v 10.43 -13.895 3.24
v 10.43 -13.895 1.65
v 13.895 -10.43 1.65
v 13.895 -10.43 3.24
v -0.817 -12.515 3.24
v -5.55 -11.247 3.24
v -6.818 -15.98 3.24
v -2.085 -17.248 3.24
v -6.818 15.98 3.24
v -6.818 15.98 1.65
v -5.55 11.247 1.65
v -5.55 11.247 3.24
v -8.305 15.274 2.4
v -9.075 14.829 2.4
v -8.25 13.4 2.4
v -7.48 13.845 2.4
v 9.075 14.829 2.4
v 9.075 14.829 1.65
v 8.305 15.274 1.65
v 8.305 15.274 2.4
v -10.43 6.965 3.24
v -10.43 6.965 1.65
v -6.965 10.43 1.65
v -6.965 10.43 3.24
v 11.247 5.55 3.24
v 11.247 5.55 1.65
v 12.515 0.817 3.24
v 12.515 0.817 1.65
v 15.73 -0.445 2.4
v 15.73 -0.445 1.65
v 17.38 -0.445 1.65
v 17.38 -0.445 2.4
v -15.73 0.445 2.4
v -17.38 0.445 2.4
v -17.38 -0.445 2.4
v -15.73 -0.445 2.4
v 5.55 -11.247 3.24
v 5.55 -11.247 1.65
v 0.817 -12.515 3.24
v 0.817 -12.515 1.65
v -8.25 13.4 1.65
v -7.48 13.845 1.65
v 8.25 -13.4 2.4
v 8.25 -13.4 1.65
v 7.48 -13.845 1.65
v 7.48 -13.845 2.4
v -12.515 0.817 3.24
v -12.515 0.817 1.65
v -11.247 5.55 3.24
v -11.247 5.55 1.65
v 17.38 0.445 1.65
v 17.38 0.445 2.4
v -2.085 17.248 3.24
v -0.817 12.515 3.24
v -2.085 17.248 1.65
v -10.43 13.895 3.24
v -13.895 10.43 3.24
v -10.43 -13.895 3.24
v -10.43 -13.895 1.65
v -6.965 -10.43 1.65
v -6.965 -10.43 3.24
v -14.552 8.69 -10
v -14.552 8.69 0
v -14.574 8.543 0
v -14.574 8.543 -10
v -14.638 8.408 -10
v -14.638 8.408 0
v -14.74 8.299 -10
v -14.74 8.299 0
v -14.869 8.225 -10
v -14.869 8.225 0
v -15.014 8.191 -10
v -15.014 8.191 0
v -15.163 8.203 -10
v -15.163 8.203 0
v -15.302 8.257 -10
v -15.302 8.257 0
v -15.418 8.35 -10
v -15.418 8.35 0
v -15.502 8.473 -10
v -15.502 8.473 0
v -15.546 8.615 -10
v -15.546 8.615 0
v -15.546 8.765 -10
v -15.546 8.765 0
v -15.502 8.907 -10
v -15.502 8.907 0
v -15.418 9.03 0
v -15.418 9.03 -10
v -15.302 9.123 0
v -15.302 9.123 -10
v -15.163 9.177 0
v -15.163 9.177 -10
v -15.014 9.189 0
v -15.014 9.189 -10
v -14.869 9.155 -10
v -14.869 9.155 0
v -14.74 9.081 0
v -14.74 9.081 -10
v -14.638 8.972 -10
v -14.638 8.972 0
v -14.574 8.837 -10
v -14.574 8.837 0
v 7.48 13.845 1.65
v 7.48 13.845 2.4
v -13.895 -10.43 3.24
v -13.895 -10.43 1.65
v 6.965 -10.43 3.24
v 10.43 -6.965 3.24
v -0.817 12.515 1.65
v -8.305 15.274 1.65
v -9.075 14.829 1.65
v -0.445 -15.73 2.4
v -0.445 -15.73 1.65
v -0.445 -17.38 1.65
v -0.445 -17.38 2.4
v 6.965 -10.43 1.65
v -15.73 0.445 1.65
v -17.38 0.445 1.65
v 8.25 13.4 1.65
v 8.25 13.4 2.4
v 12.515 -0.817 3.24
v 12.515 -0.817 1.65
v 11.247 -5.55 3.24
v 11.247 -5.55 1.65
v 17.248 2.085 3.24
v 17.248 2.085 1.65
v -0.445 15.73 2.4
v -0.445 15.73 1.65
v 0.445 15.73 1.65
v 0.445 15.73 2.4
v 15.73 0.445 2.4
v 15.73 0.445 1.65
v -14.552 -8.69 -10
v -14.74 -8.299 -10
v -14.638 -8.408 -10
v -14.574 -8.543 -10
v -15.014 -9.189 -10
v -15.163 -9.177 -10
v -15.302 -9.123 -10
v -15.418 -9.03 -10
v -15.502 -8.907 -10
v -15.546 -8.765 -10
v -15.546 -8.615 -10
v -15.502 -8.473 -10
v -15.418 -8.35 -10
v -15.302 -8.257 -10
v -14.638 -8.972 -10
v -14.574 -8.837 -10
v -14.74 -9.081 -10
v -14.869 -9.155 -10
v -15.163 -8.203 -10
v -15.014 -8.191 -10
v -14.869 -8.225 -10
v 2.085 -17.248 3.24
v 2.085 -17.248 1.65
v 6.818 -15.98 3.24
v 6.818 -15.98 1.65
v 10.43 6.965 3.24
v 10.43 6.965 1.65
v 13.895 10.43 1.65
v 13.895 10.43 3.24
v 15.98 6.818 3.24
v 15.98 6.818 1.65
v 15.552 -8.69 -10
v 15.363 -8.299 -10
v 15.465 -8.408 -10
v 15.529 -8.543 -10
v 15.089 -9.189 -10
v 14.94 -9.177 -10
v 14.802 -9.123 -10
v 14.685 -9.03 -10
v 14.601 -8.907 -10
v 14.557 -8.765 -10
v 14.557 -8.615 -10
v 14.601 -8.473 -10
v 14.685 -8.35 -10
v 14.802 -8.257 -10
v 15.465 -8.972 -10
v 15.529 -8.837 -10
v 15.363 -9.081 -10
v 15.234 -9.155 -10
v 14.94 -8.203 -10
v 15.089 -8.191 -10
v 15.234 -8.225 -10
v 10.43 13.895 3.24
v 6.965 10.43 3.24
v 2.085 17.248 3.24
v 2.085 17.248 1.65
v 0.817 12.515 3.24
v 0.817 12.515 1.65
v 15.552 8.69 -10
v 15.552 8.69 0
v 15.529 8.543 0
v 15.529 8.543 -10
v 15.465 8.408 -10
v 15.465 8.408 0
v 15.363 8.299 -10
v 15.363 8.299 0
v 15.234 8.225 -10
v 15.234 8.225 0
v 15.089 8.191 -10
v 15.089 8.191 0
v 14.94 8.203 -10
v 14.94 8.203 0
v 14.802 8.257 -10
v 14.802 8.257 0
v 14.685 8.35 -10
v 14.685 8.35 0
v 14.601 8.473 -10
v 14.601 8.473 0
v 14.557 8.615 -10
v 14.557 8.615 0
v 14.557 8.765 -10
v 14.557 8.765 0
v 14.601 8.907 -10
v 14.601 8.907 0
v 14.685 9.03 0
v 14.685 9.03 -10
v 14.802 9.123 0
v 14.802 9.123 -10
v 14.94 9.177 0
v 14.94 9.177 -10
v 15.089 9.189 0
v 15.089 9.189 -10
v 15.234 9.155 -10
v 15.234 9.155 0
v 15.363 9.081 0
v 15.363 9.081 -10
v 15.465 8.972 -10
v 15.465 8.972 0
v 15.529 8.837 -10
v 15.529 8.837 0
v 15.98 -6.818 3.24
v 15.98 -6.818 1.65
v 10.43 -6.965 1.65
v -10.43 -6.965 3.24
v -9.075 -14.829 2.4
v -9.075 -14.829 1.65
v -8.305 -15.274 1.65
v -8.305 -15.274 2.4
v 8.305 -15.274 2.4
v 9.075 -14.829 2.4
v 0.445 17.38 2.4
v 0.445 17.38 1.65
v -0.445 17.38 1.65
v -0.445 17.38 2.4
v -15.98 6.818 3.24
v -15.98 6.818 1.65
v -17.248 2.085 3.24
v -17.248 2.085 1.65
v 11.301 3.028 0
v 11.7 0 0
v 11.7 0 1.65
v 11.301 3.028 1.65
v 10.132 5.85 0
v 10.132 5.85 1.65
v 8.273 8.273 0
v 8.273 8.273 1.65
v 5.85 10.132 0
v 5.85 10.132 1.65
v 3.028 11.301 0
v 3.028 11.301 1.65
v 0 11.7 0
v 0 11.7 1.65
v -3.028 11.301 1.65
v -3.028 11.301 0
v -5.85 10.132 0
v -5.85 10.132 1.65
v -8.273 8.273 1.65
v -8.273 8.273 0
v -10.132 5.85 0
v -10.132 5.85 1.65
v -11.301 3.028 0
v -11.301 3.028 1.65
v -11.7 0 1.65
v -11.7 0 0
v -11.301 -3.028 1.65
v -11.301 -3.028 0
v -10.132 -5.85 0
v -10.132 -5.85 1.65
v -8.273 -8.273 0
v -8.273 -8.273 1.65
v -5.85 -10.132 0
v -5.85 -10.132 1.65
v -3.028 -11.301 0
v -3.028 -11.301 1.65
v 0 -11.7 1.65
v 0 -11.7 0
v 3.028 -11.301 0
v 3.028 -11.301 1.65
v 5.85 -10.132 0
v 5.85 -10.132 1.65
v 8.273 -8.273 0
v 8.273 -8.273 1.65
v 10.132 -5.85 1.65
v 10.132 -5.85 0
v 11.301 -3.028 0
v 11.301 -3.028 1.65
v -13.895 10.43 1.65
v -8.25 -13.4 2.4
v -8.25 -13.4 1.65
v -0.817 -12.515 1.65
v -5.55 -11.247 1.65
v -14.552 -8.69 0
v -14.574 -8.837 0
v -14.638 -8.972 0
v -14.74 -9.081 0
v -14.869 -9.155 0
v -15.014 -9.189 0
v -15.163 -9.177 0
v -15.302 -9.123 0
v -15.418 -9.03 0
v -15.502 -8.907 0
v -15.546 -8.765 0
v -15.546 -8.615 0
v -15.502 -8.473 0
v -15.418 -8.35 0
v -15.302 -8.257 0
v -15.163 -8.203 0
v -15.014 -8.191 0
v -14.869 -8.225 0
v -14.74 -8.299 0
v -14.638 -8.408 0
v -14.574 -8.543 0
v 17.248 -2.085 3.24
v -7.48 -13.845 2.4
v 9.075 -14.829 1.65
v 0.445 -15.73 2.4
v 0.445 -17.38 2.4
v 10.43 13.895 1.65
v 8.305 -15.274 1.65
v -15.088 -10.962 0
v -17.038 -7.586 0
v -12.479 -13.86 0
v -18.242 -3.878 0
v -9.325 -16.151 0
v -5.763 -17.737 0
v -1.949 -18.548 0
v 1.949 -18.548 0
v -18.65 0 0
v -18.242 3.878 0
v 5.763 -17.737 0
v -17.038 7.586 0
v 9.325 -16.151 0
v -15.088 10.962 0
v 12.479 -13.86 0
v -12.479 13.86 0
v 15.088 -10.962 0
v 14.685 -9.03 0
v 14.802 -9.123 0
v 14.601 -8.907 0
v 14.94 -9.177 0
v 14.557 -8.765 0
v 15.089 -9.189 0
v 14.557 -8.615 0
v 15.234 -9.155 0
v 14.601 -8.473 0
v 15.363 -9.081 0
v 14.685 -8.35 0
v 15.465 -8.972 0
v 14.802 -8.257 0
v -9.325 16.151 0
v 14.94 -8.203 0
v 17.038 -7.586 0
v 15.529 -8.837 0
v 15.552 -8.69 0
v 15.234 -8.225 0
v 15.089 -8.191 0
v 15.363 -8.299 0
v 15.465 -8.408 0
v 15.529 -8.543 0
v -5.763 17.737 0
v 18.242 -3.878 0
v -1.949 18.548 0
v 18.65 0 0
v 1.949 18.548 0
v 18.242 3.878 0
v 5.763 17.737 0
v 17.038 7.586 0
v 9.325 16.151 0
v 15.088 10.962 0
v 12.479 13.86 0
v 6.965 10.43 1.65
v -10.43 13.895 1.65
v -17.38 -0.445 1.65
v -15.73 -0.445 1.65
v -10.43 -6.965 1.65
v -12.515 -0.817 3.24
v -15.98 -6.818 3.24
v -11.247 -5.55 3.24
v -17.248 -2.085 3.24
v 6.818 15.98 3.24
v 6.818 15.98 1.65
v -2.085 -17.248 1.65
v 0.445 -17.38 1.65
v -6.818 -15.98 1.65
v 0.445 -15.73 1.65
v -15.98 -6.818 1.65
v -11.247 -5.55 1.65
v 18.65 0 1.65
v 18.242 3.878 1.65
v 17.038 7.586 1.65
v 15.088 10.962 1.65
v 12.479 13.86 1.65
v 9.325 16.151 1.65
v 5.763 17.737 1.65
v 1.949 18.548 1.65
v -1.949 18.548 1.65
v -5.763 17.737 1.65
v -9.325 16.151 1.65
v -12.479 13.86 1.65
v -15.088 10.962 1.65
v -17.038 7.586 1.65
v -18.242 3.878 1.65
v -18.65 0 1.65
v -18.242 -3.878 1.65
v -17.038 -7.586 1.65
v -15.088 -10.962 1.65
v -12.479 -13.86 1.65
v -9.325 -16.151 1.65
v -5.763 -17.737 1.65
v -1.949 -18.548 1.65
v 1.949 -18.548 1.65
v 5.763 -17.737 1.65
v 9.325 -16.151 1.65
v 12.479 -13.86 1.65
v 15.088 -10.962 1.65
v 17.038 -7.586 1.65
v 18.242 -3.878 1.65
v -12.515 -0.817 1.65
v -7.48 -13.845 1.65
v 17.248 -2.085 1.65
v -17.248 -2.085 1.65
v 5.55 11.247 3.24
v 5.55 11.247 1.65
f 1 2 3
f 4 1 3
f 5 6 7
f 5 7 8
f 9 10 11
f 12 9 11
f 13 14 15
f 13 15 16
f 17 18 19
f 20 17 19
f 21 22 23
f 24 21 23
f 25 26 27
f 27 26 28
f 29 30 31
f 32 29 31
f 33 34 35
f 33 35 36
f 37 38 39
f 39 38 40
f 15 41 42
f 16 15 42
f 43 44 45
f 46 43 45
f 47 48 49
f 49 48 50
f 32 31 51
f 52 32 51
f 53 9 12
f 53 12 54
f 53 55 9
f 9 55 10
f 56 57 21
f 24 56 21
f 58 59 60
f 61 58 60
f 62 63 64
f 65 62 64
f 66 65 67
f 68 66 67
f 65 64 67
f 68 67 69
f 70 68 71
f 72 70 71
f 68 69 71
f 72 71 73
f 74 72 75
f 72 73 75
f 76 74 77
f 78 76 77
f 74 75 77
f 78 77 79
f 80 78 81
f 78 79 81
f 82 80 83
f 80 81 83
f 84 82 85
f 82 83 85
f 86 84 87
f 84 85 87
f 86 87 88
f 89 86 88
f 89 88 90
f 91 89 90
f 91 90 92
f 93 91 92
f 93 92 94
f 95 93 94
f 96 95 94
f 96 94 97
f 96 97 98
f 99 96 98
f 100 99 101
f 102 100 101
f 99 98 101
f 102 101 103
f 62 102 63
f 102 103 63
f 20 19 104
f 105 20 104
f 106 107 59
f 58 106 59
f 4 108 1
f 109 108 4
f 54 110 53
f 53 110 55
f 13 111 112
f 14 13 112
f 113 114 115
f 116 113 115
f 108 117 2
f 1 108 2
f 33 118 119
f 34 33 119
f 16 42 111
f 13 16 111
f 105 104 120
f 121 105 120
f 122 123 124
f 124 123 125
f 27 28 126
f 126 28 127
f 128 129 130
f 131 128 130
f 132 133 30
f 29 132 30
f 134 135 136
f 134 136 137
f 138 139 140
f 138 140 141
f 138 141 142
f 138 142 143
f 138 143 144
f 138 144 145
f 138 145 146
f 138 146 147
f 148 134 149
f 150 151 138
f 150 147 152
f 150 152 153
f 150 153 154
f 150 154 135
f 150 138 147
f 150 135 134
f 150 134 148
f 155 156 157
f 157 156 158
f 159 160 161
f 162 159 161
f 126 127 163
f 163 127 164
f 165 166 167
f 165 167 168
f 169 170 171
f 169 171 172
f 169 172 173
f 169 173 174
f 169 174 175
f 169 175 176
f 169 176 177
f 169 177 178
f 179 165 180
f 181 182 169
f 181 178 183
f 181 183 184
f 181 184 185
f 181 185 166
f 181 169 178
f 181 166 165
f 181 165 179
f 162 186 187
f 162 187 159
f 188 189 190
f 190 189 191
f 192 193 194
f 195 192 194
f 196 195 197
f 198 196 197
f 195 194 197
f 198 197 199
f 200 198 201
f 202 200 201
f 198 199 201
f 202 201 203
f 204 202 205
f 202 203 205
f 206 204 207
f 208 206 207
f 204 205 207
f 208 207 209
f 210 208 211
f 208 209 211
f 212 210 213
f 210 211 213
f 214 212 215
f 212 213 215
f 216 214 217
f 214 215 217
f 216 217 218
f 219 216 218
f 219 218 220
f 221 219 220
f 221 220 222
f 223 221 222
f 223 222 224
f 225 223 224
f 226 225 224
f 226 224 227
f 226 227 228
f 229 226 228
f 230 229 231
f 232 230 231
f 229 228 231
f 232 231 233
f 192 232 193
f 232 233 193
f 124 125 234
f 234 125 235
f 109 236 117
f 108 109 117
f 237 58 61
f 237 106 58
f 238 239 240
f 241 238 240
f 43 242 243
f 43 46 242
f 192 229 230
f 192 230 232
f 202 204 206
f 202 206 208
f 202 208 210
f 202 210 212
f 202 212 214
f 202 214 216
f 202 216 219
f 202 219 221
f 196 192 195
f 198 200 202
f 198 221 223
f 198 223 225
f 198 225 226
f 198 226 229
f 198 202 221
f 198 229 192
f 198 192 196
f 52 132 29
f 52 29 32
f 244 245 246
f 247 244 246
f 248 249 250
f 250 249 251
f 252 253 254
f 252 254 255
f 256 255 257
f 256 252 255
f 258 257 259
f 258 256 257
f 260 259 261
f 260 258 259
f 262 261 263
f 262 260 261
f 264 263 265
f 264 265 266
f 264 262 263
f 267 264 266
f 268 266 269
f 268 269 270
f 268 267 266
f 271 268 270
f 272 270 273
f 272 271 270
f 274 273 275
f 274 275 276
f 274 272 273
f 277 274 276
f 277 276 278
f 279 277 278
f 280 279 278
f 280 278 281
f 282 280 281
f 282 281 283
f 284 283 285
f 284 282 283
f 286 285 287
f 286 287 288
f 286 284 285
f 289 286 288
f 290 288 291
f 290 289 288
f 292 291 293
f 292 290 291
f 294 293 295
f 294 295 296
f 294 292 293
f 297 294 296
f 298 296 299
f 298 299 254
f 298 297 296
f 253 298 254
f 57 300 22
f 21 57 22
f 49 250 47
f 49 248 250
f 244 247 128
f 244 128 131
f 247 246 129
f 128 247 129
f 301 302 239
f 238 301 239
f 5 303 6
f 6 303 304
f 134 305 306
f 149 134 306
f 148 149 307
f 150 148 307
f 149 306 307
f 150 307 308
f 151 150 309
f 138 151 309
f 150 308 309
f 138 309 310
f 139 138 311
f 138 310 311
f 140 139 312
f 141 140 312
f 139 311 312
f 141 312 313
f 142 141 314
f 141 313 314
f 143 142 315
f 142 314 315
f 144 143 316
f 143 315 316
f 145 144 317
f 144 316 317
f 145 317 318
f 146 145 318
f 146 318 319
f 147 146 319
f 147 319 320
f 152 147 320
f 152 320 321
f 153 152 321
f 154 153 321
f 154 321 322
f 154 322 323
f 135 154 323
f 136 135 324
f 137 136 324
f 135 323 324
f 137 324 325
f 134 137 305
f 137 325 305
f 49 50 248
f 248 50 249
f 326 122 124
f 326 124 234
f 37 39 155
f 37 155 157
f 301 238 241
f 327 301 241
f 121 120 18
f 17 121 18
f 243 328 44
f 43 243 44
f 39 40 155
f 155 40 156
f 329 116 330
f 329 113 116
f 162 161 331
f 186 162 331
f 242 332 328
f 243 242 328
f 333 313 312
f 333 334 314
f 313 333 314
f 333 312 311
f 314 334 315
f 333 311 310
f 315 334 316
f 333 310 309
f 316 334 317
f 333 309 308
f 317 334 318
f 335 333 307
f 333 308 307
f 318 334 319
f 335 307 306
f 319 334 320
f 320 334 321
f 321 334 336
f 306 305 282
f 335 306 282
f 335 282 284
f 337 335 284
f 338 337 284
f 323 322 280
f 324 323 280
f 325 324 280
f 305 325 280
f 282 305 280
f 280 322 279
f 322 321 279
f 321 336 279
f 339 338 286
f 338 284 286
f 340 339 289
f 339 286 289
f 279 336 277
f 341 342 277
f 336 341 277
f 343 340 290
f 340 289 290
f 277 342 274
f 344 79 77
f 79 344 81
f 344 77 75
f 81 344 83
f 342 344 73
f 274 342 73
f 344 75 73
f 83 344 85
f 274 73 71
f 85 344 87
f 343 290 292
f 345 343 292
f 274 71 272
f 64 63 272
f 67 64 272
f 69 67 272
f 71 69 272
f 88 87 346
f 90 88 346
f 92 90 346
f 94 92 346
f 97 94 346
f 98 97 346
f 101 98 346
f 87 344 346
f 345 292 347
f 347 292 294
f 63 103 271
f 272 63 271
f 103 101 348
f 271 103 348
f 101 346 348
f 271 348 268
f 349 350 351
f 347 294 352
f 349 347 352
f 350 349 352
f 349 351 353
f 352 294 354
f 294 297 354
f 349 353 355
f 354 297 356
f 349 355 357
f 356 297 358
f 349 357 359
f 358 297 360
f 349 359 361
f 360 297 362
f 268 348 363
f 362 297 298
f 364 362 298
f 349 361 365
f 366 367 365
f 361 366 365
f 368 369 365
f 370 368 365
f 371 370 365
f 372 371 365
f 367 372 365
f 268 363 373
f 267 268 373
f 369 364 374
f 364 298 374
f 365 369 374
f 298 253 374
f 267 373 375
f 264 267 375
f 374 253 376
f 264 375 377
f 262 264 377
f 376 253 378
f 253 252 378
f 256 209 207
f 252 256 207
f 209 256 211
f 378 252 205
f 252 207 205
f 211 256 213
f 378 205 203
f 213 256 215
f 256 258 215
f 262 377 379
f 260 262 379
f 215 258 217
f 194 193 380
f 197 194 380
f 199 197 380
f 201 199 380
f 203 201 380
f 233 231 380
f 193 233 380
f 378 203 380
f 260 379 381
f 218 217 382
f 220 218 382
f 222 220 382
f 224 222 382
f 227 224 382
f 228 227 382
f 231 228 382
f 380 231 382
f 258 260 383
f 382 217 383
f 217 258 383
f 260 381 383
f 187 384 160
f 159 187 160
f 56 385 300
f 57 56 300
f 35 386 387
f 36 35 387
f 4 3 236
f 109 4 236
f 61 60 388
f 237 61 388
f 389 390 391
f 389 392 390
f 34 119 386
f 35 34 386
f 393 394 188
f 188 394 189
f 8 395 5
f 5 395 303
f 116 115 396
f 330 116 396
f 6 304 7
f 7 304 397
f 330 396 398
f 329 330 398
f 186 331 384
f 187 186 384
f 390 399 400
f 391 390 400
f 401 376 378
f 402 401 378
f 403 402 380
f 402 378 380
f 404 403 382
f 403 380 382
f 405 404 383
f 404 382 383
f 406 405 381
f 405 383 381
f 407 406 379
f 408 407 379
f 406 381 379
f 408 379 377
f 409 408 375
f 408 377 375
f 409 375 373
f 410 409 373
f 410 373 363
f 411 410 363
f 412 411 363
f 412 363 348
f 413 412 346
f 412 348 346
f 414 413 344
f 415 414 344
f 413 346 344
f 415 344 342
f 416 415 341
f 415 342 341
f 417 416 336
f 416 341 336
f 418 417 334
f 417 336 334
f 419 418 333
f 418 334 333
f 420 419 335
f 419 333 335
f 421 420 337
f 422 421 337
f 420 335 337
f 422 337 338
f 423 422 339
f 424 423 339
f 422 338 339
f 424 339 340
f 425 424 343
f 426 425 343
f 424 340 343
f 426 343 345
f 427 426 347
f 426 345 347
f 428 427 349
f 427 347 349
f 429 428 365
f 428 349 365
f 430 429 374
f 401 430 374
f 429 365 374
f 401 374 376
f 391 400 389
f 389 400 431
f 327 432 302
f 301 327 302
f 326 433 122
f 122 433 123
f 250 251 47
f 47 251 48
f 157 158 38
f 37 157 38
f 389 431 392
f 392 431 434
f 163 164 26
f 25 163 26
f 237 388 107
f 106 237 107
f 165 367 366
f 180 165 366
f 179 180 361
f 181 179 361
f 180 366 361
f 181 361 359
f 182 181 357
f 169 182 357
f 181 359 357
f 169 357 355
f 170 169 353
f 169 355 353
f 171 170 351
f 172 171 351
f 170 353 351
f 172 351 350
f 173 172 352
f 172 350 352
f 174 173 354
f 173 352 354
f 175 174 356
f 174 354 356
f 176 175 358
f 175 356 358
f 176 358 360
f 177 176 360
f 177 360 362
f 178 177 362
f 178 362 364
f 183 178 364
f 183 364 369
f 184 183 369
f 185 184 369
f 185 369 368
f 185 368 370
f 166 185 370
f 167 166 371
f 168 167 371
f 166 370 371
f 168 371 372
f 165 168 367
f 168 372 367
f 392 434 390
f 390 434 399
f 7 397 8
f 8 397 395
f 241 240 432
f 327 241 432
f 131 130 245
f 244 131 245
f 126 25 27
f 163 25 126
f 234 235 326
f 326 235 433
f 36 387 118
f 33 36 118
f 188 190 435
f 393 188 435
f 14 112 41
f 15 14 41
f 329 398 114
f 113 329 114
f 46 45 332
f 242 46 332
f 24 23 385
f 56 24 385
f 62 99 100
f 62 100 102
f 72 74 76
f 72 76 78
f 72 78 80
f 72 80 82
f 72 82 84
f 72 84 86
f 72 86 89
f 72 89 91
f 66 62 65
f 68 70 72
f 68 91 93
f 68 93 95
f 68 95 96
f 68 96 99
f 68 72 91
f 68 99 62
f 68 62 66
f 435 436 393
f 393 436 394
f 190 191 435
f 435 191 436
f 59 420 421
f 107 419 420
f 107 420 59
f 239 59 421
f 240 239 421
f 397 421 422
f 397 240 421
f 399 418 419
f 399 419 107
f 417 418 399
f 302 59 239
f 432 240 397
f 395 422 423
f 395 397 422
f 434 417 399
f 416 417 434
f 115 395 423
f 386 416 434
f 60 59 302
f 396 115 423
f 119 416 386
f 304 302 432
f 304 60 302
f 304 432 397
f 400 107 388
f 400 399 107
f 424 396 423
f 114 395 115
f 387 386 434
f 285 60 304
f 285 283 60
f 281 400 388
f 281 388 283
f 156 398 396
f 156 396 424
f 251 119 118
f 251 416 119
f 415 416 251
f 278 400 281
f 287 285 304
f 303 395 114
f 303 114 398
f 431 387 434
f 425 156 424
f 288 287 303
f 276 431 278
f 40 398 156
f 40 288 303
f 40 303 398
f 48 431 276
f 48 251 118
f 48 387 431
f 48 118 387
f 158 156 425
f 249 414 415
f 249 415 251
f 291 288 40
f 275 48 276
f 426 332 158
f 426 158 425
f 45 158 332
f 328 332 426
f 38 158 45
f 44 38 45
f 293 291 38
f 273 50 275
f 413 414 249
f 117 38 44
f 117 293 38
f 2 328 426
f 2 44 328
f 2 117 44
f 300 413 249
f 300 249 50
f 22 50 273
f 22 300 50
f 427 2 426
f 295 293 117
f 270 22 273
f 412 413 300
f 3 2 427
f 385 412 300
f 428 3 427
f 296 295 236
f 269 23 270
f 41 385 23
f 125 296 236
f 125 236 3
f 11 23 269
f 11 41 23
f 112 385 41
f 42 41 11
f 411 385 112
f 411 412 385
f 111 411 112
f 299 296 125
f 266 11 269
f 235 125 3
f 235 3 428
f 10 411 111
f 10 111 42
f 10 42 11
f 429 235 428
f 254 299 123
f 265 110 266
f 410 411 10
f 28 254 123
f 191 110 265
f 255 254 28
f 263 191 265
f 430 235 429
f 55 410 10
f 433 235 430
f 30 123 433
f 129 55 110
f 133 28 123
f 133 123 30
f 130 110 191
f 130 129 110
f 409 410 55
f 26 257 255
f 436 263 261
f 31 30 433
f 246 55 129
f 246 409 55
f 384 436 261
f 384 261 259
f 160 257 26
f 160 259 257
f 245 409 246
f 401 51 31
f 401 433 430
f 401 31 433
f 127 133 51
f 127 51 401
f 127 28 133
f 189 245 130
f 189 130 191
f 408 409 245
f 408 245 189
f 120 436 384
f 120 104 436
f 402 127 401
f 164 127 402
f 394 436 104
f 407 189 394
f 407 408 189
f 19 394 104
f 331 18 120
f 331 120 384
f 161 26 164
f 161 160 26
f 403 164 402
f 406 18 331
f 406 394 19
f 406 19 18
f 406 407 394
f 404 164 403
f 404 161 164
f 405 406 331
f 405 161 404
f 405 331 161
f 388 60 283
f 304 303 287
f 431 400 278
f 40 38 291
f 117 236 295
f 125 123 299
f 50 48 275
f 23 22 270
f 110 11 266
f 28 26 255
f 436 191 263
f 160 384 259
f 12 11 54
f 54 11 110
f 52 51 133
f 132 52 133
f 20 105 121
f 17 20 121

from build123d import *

# Parameters (mm, degrees)
F0_R     = 18.65
F0_R_2   = 11.7
F1_DEPTH = 1.65
F3_DEPTH = 1.59
F5_DEPTH = 0.75
F6_R     = 0.5
F7_DEPTH = 10


with BuildPart() as f1:
    # F0 (on Top) → F1 (new body)
    with BuildSketch(Plane.XY):
        Circle(F0_R)
        Circle(F0_R_2, mode=Mode.SUBTRACT)
    extrude(amount=F1_DEPTH)

    # F2 (on face) → F3 (join)
    with BuildSketch(Plane.XY.offset(1.65)):
        Polygon((6.8182058502, 15.9798175517), (4.4516875758, 16.6139242122), (2.0851693014, 17.2480308727), (0.8169559804, 12.5149943239), (3.1834742548, 11.8808876634), (5.5499925292, 11.2467810029), align=None)
        Polygon((-6.8182058502, 15.9798175517), (-5.5499925292, 11.2467810029), (-3.1834742548, 11.8808876634), (-0.8169559804, 12.5149943239), (-2.0851693014, 17.2480308727), (-4.4516875758, 16.6139242122), align=None)
        Polygon((-13.8946482503, 10.4298250225), (-10.4298250225, 6.9650017947), (-8.6974134086, 8.6974134086), (-6.9650017947, 10.4298250225), (-10.4298250225, 13.8946482503), (-12.1622366364, 12.1622366364), align=None)
        Polygon((-17.2480308727, 2.0851693014), (-12.5149943239, 0.8169559804), (-11.8808876634, 3.1834742548), (-11.2467810029, 5.5499925292), (-15.9798175517, 6.8182058502), (-16.6139242122, 4.4516875758), align=None)
        Polygon((-15.9798175517, -6.8182058502), (-11.2467810029, -5.5499925292), (-11.8808876634, -3.1834742548), (-12.5149943239, -0.8169559804), (-17.2480308727, -2.0851693014), (-16.6139242122, -4.4516875758), align=None)
        Polygon((-10.4298250225, -13.8946482503), (-6.9650017947, -10.4298250225), (-8.6974134086, -8.6974134086), (-10.4298250225, -6.9650017947), (-13.8946482503, -10.4298250225), (-12.1622366364, -12.1622366364), align=None)
        Polygon((-2.0851693014, -17.2480308727), (-0.8169559804, -12.5149943239), (-3.1834742548, -11.8808876634), (-5.5499925292, -11.2467810029), (-6.8182058502, -15.9798175517), (-4.4516875758, -16.6139242122), align=None)
        Polygon((6.8182058502, -15.9798175517), (5.5499925292, -11.2467810029), (3.1834742548, -11.8808876634), (0.8169559804, -12.5149943239), (2.0851693014, -17.2480308727), (4.4516875758, -16.6139242122), align=None)
        Polygon((13.8946482503, -10.4298250225), (10.4298250225, -6.9650017947), (8.6974134086, -8.6974134086), (6.9650017947, -10.4298250225), (10.4298250225, -13.8946482503), (12.1622366364, -12.1622366364), align=None)
        Polygon((17.2480308727, -2.0851693014), (12.5149943239, -0.8169559804), (11.8808876634, -3.1834742548), (11.2467810029, -5.5499925292), (15.9798175517, -6.8182058502), (16.6139242122, -4.4516875758), align=None)
        Polygon((15.9798175517, 6.8182058502), (11.2467810029, 5.5499925292), (11.8808876634, 3.1834742548), (12.5149943239, 0.8169559804), (17.2480308727, 2.0851693014), (16.6139242122, 4.4516875758), align=None)
        Polygon((10.4298250225, 13.8946482503), (6.9650017947, 10.4298250225), (8.6974134086, 8.6974134086), (10.4298250225, 6.9650017947), (13.8946482503, 10.4298250225), (12.1622366364, 12.1622366364), align=None)
    extrude(amount=F3_DEPTH)

    # F4 (on face) → F5 (join)
    with BuildSketch(Plane.XY.offset(1.65)):
        Polygon((0.445, 17.38), (0, 17.38), (-0.445, 17.38), (-0.445, 15.73), (0, 15.73), (0.445, 15.73), align=None)
        Polygon((9.0753813047, 14.8290215178), (8.69, 15.0515215178), (8.3046186953, 15.2740215178), (7.4796186953, 13.8450796015), (7.865, 13.6225796015), (8.2503813047, 13.4000796015), align=None)
        Polygon((17.38, 0), (17.38, 0.445), (15.73, 0.445), (15.73, 0), (15.73, -0.445), (17.38, -0.445), align=None)
        Polygon((-15.73, 0.445), (-17.38, 0.445), (-17.38, 0), (-17.38, -0.445), (-15.73, -0.445), (-15.73, 0), align=None)
        Polygon((-7.4796186953, 13.8450796015), (-8.3046186953, 15.2740215178), (-8.69, 15.0515215178), (-9.0753813047, 14.8290215178), (-8.2503813047, 13.4000796015), (-7.865, 13.6225796015), align=None)
        Polygon((-8.2503813047, -13.4000796015), (-9.0753813047, -14.8290215178), (-8.69, -15.0515215178), (-8.3046186953, -15.2740215178), (-7.4796186953, -13.8450796015), (-7.865, -13.6225796015), align=None)
        Polygon((-0.445, -17.38), (0, -17.38), (0.445, -17.38), (0.445, -15.73), (0, -15.73), (-0.445, -15.73), align=None)
        Polygon((8.3046186953, -15.2740215178), (8.69, -15.0515215178), (9.0753813047, -14.8290215178), (8.2503813047, -13.4000796015), (7.865, -13.6225796015), (7.4796186953, -13.8450796015), align=None)
    extrude(amount=F5_DEPTH)

    # F6 (on face) → F7 (join)
    with BuildSketch(Plane(origin=(0, 0, 0), x_dir=(1, 0, 0), z_dir=(0, 0, -1))):
        with Locations((-15.0515215178, 8.69)):
            Circle(F6_R)
        with Locations((-15.0515215178, -8.69)):
            Circle(F6_R)
        with Locations((15.0515215178, -8.69)):
            Circle(F6_R)
        with Locations((15.0515215178, 8.69)):
            Circle(F6_R)
    extrude(amount=F7_DEPTH)


solid = f1.part
